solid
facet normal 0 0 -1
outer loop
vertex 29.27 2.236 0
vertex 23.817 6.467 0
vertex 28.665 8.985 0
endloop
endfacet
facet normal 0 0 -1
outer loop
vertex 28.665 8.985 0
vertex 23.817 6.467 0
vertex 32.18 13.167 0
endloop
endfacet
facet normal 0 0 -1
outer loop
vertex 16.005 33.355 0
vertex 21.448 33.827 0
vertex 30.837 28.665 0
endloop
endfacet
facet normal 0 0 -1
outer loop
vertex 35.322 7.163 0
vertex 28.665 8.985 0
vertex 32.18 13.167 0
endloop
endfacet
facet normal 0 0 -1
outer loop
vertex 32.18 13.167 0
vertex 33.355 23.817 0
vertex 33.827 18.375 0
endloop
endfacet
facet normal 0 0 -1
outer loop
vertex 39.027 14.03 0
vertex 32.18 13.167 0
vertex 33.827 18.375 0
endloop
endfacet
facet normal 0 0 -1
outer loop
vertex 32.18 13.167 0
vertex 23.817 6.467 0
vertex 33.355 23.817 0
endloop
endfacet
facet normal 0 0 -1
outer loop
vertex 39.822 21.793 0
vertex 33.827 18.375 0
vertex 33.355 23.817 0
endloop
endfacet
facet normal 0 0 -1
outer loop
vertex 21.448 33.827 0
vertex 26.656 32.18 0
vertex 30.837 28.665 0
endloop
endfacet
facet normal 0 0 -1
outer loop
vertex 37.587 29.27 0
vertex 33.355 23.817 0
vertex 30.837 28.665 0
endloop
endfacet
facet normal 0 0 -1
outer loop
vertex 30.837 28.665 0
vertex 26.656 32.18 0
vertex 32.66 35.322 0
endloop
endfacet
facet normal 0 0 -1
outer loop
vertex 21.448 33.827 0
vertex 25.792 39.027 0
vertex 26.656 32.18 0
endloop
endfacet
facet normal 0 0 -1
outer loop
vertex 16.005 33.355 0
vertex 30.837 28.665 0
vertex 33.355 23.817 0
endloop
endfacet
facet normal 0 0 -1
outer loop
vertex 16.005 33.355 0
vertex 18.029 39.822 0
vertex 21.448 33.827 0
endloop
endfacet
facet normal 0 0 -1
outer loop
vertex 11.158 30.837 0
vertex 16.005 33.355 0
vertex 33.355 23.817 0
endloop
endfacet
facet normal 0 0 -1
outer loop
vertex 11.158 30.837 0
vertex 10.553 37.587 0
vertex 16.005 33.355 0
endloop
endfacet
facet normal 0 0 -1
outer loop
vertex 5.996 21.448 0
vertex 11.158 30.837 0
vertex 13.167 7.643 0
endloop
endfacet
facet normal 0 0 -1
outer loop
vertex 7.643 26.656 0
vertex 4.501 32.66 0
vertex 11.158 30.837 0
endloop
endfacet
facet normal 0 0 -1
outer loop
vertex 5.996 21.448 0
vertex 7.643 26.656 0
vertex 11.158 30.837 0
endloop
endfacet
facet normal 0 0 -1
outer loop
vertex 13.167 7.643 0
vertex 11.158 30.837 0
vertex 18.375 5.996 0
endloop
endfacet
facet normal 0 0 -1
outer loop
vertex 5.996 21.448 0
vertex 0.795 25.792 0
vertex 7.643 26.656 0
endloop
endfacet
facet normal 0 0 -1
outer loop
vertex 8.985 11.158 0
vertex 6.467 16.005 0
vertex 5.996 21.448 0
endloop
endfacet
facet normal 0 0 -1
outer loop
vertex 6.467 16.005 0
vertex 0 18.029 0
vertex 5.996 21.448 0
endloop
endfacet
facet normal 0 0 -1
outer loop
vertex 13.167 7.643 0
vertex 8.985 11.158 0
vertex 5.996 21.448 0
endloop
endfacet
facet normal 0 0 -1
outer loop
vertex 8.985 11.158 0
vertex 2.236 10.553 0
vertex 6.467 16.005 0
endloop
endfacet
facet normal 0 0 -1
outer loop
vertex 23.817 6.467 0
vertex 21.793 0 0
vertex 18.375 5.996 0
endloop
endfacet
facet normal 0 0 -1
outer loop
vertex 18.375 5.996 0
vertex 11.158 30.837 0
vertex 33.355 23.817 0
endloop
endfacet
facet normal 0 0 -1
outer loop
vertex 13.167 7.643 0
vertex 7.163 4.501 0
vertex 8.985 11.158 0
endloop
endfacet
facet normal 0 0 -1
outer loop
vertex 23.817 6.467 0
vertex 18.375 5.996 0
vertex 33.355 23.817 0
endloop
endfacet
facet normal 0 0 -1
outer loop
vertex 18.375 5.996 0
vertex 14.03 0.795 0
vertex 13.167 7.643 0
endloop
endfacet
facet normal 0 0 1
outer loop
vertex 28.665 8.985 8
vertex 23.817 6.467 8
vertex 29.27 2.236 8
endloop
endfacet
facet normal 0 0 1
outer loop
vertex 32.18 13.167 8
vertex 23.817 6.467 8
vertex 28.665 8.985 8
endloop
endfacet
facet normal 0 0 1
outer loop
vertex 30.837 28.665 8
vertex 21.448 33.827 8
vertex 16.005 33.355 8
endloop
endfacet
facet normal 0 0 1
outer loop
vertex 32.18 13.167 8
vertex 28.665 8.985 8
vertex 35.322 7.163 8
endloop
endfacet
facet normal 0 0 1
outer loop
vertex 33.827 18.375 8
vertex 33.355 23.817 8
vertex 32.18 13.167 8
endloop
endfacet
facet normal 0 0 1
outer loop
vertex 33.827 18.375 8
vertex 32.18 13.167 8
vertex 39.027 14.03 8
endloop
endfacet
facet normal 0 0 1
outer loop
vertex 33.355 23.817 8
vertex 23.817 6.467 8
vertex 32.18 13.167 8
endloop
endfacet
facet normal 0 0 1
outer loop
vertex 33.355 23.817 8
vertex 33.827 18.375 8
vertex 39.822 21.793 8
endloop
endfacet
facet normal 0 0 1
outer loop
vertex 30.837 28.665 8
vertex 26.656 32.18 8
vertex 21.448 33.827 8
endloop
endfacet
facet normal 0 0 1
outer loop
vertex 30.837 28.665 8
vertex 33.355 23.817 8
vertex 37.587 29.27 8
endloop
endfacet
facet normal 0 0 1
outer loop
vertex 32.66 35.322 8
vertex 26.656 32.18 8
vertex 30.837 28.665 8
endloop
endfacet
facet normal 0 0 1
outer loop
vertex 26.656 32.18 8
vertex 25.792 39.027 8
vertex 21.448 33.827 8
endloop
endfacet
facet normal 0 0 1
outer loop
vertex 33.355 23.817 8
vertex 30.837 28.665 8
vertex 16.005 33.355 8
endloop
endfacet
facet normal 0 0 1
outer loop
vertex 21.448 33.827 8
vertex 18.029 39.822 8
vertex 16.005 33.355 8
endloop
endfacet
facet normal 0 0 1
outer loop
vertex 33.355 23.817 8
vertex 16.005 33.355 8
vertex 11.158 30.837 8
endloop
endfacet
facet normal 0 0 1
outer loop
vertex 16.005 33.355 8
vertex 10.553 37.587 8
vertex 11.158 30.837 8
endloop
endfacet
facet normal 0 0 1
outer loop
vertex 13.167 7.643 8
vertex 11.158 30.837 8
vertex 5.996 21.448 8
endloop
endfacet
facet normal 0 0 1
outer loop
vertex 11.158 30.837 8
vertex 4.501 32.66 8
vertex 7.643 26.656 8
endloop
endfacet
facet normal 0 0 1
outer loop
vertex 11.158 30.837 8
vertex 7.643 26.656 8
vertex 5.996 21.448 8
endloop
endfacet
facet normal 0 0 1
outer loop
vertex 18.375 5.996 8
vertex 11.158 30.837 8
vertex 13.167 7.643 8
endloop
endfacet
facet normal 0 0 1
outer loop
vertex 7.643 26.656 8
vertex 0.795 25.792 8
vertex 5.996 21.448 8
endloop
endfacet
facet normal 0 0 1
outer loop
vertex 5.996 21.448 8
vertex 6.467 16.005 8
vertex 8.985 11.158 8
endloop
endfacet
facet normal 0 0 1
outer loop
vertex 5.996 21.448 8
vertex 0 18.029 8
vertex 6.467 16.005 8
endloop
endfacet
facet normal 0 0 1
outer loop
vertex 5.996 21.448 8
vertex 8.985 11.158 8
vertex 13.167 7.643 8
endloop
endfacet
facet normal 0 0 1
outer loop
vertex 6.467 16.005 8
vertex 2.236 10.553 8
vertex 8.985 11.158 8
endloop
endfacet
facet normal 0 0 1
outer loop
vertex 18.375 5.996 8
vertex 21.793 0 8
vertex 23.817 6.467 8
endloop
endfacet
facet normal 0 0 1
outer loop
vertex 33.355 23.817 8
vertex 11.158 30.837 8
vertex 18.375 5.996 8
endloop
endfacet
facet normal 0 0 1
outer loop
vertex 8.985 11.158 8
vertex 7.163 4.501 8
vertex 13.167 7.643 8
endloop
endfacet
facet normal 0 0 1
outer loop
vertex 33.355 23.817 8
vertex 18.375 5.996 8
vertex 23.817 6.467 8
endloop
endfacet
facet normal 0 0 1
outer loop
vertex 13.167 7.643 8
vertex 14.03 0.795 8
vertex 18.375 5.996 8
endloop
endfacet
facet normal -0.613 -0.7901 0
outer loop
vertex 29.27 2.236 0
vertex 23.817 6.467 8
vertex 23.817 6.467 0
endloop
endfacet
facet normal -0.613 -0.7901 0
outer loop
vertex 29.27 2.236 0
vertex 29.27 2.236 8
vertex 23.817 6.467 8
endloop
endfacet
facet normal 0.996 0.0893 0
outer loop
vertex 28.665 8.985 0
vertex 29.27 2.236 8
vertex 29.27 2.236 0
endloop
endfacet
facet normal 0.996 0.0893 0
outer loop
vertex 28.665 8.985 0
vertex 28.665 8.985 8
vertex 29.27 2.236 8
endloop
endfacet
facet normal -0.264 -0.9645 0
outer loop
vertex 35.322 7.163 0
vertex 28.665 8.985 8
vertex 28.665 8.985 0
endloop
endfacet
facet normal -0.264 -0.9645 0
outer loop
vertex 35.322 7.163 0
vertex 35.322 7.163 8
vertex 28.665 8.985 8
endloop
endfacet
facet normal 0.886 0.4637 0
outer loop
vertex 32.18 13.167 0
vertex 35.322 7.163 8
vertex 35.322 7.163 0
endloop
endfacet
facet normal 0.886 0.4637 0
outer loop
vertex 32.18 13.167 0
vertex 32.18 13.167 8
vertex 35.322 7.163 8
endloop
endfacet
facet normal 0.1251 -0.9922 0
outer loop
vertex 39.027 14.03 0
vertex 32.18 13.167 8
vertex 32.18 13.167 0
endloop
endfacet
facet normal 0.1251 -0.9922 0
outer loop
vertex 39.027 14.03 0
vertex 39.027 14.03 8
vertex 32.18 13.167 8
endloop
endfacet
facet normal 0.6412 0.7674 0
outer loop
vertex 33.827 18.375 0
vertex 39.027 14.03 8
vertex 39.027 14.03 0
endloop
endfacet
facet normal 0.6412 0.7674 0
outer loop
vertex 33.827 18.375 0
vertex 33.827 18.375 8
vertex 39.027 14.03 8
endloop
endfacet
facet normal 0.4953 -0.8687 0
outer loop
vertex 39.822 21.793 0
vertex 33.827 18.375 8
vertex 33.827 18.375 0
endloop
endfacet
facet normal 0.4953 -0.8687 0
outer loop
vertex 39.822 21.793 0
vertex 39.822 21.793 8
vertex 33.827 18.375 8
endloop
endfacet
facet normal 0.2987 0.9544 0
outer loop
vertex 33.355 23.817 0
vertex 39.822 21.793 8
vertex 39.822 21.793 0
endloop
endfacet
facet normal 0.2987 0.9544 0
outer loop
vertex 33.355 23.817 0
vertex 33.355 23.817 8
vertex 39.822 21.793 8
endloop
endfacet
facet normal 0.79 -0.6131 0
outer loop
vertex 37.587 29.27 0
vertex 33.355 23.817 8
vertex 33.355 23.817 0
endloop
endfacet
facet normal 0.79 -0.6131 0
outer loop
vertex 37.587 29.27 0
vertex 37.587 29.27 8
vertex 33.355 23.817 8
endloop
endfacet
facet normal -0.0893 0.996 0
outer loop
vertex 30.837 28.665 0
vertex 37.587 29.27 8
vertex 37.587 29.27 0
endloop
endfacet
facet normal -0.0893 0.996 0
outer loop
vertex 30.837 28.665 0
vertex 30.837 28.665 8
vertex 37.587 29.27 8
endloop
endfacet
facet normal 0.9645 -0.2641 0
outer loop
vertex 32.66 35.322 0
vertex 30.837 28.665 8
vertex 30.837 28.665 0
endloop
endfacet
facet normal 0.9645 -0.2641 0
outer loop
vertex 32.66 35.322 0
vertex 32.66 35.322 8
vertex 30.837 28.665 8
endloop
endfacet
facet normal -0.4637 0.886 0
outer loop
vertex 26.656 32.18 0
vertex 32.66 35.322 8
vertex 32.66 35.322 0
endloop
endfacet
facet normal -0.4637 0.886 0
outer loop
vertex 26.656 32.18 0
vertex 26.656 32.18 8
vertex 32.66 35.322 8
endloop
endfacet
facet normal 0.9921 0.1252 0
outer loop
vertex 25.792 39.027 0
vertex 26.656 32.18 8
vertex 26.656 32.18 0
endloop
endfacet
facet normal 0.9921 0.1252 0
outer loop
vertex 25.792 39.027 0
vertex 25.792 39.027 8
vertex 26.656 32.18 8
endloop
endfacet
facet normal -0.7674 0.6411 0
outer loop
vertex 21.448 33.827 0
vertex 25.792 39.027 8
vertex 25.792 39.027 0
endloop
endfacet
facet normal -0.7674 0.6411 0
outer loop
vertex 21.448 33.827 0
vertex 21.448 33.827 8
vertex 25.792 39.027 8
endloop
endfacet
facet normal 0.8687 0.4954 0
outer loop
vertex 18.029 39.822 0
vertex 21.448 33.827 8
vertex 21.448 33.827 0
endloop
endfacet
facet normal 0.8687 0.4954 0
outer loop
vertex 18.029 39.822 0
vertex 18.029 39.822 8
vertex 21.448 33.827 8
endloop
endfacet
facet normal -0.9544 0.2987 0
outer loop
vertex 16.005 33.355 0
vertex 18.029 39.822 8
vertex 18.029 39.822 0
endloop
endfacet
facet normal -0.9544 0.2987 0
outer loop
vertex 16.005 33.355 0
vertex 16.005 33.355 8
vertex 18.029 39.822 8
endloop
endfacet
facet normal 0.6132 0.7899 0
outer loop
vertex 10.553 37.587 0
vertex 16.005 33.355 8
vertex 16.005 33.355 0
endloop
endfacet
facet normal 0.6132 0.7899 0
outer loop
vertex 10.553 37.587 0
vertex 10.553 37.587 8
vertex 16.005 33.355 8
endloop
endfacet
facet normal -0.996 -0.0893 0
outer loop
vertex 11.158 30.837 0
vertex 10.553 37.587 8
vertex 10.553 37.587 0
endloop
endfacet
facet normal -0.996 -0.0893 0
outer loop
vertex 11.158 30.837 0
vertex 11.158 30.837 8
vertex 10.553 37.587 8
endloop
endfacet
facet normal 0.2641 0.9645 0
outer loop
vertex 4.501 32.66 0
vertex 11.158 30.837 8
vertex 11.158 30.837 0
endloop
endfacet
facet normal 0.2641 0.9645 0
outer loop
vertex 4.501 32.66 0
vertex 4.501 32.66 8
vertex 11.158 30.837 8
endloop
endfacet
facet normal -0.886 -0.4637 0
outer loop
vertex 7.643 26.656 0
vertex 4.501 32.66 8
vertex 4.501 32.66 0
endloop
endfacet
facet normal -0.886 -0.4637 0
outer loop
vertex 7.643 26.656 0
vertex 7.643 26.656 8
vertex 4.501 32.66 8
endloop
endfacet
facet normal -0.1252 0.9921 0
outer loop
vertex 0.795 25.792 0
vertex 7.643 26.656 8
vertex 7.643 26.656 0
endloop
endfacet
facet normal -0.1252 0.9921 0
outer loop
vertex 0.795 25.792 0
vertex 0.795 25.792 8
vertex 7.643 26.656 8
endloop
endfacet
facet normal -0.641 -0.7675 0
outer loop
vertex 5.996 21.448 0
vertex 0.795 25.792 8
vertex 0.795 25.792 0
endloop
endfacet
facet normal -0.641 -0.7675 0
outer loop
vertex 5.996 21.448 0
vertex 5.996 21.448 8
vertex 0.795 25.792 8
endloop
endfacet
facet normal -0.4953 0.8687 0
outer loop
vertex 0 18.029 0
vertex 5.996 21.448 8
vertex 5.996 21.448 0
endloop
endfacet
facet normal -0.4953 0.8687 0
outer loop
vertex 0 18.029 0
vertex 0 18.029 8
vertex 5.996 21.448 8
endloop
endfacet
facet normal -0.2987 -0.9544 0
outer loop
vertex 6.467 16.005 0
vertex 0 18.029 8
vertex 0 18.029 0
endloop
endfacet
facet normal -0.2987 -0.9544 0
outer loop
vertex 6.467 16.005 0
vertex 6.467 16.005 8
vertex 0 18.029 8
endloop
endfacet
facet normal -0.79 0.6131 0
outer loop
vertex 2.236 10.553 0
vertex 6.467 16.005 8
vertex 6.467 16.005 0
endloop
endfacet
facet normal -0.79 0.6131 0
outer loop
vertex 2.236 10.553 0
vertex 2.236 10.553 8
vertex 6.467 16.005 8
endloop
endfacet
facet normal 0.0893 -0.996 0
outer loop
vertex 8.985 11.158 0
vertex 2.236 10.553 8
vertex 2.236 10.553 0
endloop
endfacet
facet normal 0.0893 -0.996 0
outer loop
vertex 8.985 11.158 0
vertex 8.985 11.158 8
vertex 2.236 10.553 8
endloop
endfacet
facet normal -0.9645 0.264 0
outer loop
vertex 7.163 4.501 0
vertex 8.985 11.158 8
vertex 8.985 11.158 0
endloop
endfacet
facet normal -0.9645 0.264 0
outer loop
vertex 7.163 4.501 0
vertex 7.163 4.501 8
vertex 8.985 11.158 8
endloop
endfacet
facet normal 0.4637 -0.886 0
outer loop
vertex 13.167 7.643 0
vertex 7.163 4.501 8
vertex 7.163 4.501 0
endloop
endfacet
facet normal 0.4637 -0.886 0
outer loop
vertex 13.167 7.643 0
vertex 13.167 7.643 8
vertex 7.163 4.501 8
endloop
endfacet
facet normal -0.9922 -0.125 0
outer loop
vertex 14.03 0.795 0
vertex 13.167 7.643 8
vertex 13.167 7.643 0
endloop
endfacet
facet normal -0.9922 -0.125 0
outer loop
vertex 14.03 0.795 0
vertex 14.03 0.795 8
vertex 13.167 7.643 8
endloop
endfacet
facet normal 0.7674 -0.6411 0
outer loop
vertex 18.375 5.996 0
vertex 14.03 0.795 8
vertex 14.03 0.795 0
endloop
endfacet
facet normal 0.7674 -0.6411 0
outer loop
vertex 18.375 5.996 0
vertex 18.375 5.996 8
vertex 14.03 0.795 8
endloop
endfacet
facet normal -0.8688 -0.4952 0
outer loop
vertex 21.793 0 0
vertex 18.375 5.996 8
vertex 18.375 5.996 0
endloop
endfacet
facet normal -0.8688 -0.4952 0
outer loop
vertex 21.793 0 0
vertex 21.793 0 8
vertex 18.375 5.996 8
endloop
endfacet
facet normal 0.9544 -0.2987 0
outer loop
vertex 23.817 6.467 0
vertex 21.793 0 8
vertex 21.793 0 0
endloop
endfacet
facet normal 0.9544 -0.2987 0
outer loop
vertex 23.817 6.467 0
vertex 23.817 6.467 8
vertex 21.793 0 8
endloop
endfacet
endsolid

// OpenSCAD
$fn = 32;

// ----------------------------------------------------------------------
// Chain sprocket: 16 teeth, 14 mm root radius
// ----------------------------------------------------------------------

// --- parameters (mm) ---
profile_height = 8;       // extrusion height
profile_points = 32;      // points of the closed outline

profile = [[33.827, 18.375], [39.822, 21.793], [33.355, 23.817], [37.587, 29.27], [30.837, 28.665], [32.66, 35.322], [26.656, 32.18], [25.792, 39.027], [21.448, 33.827], [18.029, 39.822], [16.005, 33.355], [10.553, 37.587], [11.158, 30.837], [4.501, 32.66], [7.643, 26.656], [0.795, 25.792], [5.996, 21.448], [0, 18.029], [6.467, 16.005], [2.236, 10.553], [8.985, 11.158], [7.163, 4.501], [13.167, 7.643], [14.03, 0.795], [18.375, 5.996], [21.793, 0], [23.817, 6.467], [29.27, 2.236], [28.665, 8.985], [35.322, 7.163], [32.18, 13.167], [39.027, 14.03]];  // single closed polygon, 32 points, counter clockwise

// --- the one profile operation ---
linear_extrude(height = profile_height) polygon(points = profile);
